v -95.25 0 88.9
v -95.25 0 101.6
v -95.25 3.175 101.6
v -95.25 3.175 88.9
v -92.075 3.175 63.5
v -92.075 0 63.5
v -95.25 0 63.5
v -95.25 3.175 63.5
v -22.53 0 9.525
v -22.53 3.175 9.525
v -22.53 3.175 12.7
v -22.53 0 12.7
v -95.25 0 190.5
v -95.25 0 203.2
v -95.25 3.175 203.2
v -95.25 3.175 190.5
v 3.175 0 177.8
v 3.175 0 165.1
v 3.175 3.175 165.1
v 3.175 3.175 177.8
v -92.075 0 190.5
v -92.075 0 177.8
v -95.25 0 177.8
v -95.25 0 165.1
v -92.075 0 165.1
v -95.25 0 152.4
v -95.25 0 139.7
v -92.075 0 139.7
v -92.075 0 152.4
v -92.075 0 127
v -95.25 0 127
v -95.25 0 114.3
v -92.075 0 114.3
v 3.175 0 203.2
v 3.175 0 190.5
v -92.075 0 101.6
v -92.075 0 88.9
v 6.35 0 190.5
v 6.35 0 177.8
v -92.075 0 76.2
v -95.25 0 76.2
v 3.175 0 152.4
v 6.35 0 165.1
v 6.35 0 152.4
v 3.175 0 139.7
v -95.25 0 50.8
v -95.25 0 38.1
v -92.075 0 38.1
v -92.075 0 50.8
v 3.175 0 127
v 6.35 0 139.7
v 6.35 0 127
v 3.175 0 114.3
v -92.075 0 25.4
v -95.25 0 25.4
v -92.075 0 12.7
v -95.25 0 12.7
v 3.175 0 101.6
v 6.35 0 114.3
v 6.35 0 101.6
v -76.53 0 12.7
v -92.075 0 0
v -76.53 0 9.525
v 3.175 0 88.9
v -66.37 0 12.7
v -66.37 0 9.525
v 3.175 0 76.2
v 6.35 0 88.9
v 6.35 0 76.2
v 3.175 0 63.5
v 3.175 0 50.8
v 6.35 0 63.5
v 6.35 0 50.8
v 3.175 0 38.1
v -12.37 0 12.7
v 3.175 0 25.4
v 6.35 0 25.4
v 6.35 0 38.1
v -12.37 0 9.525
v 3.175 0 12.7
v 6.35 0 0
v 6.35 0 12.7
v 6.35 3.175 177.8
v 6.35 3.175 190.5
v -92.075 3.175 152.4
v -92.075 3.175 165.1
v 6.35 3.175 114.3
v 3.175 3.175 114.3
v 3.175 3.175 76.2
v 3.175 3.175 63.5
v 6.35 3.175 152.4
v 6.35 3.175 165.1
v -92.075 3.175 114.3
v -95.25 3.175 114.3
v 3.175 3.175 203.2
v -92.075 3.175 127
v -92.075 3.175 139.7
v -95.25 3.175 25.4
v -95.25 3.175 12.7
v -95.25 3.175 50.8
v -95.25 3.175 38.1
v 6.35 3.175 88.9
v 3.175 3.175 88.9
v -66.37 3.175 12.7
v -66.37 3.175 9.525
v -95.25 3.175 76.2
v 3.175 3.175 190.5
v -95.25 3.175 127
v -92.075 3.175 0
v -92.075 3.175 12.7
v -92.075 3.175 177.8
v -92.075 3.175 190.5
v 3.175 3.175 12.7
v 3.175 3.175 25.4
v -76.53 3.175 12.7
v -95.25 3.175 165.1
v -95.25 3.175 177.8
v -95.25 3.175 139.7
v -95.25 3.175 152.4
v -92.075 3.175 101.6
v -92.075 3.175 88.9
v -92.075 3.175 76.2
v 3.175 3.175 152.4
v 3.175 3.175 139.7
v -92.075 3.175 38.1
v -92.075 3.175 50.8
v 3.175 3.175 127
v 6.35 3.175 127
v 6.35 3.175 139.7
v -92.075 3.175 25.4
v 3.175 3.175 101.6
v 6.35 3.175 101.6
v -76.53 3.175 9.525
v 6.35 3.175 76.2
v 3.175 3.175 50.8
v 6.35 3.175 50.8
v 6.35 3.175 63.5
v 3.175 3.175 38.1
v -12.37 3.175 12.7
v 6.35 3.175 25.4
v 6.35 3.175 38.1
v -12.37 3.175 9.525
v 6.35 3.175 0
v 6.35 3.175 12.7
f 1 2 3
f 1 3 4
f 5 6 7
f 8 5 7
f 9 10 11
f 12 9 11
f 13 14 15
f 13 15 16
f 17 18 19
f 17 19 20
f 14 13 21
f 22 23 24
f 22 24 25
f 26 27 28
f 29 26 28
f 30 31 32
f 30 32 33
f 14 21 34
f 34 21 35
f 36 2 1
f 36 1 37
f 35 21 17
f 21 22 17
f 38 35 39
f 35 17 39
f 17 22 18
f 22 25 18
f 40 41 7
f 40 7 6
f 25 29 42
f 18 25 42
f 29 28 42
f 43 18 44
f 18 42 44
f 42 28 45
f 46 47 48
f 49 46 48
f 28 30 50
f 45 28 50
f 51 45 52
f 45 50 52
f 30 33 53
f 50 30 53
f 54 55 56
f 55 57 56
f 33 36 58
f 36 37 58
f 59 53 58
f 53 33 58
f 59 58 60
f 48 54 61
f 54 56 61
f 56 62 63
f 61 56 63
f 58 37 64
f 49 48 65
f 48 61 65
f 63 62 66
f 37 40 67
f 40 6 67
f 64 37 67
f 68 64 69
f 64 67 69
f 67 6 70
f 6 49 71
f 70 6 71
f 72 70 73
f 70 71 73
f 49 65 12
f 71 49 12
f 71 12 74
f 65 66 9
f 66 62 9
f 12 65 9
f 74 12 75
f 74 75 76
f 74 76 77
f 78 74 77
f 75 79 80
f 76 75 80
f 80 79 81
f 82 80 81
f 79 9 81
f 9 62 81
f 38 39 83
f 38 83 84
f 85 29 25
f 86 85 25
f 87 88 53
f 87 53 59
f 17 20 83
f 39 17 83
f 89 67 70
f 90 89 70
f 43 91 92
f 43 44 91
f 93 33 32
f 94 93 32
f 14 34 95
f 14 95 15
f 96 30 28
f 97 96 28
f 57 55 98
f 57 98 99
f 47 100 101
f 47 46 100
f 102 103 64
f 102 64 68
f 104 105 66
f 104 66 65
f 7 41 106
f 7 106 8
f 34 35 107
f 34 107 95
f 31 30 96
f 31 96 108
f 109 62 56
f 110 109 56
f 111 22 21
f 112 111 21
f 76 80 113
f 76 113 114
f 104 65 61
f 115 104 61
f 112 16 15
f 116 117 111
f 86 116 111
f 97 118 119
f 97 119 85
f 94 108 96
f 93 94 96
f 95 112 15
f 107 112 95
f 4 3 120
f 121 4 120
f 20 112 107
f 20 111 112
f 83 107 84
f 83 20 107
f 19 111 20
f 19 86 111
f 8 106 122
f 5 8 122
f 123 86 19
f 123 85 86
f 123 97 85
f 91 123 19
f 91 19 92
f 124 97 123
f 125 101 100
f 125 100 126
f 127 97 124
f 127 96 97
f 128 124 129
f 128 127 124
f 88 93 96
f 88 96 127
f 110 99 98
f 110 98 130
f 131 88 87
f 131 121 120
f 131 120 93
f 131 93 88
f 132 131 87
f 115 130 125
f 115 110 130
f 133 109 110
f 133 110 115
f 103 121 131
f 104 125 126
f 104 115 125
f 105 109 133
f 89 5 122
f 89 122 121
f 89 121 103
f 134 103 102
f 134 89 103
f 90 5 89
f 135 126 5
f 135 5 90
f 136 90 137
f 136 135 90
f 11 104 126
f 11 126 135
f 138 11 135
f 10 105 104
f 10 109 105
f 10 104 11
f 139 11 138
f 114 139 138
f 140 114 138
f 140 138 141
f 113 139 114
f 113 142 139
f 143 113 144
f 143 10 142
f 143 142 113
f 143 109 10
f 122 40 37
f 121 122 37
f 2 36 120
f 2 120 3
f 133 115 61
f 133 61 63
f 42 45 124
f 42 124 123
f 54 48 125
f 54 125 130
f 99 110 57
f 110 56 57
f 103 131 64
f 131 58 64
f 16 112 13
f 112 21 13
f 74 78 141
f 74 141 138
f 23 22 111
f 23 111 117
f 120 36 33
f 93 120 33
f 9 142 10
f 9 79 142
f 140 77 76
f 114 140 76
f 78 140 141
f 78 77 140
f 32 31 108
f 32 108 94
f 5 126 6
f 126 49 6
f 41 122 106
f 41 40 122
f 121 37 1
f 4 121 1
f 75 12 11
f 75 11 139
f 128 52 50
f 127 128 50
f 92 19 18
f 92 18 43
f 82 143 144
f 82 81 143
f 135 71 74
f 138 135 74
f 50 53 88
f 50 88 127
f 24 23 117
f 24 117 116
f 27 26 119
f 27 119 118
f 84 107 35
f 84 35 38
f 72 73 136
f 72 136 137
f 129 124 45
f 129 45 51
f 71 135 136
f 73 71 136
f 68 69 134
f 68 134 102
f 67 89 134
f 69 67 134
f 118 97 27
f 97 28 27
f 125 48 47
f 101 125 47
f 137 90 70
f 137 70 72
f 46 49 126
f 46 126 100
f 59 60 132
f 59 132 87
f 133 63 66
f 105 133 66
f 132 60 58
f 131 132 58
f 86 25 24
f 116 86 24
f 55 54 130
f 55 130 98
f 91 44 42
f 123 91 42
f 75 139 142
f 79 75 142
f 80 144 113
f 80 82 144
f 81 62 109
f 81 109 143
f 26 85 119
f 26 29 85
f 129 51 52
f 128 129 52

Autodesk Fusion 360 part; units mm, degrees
sketch "Sketch1" plane through (0, 0, 0) normal (0, 1, 0) x (1, 0, 0)
  line L0 (3.175, -50.8) -> (3.175, -38.1)
  line L1 (3.175, -38.1) -> (3.175, -25.4)
  line L2 (6.35, -12.7) -> (3.175, -12.7)
  line L3 (3.175, -63.5) -> (6.35, -63.5)
  line L4 (3.175, -76.2) -> (3.175, -63.5)
  line L5 (6.35, -25.4) -> (3.175, -25.4)
  line L6 (3.175, -88.9) -> (3.175, -76.2)
  line L7 (6.35, -25.4) -> (6.35, -38.1)
  line L8 (6.35, -38.1) -> (3.175, -38.1)
  line L9 (3.175, -12.7) -> (3.175, 0)
  line L10 (3.175, -60.2676) -> (2.1543, -60.2676)
  line L11 (3.175, 0) -> (3.175, -59.055)
  line L12 (6.35, 0) -> (3.175, 0)
  line L13 (3.175, -25.4) -> (3.175, -12.7)
  line L14 (3.175, -101.6) -> (3.175, -88.9)
  line L15 (3.175, -76.2) -> (6.35, -76.2)
  line L16 (-95.25, -25.4) -> (-95.25, -12.7)
  line L17 (-92.075, -139.7) -> (-95.25, -139.7)
  line L18 (3.175, 0) -> (3.175, -203.2)
  line L19 (-92.075, -50.8) -> (-95.25, -50.8)
  line L20 (3.175, -50.8) -> (6.35, -50.8)
  line L21 (6.35, 0) -> (-4.7498, 0)
  line L22 (3.175, -88.9) -> (6.35, -88.9)
  line L23 (-92.075, -38.1) -> (-92.075, -25.4)
  line L24 (-92.075, -127) -> (-92.075, -114.3)
  line L25 (-95.25, 0) -> (6.35, 0)
  line L26 (-92.075, -203.2) -> (-92.075, -190.5)
  line L27 (3.175, -63.5) -> (3.175, -50.8)
  line L28 (6.35, -50.8) -> (6.35, -63.5)
  line L29 (-92.075, 0) -> (-92.075, -203.2)
  line L30 (6.35, -76.2) -> (6.35, -88.9)
  line L31 (-92.075, -95.25) -> (-92.075, -88.9)
  line L32 (6.35, 0) -> (-5.715, 0)
  line L33 (-95.25, 0) -> (-79.375, 0)
  line L34 (-92.075, -25.4) -> (-95.25, -25.4)
  line L35 (-92.075, -76.2) -> (-92.075, -63.5)
  line L36 (-4.7498, 0) -> (0.3302, 0)
  line L37 (6.35, 0) -> (6.35, -12.7)
  line L38 (6.35, -101.6) -> (3.175, -101.6)
  line L39 (-92.075, -177.8) -> (-95.25, -177.8)
  line L40 (-84.1502, 0) -> (-89.2302, 0)
  line L41 (-92.075, -139.7) -> (-92.075, -127)
  line L42 (-89.5189, -92.8088) -> (-89.7576, -92.8956)
  line L43 (-95.25, -101.6) -> (-95.25, -88.9)
  line L44 (6.35, -177.8) -> (6.35, -190.5)
  line L45 (6.35, -152.4) -> (6.35, -165.1)
  line L46 (3.175, -203.2) -> (3.175, -190.5)
  line L47 (3.175, -190.5) -> (3.175, -177.8)
  line L48 (-92.075, -63.5) -> (-95.25, -63.5)
  line L49 (-92.075, -25.4) -> (-92.075, -12.7)
  line L50 (-92.075, -190.5) -> (-95.25, -190.5)
  line L51 (-92.075, -12.7) -> (-95.25, -12.7)
  line L52 (3.175, -203.2) -> (-95.25, -203.2)
  line L53 (-92.075, -177.8) -> (-92.075, -165.1)
  line L54 (-92.075, -101.6) -> (-92.075, -95.25)
  line L55 (-92.075, -76.2) -> (-95.25, -76.2)
  line L56 (-95.25, -76.2) -> (-95.25, -63.5)
  line L57 (3.175, -114.3) -> (6.35, -114.3)
  line L58 (-95.25, -203.2) -> (-95.25, -190.5)
  line L59 (-92.075, -63.5) -> (-92.075, -50.8)
  line L60 (-92.075, -50.8) -> (-92.075, -38.1)
  line L61 (-92.075, -152.4) -> (-95.25, -152.4)
  line L62 (-92.075, -88.9) -> (-95.25, -88.9)
  line L63 (-92.075, -152.4) -> (-92.075, -139.7)
  line L64 (-95.25, -203.2) -> (-92.075, -203.2)
  line L65 (6.35, -152.4) -> (3.175, -152.4)
  line L66 (-92.075, -165.1) -> (-92.075, -152.4)
  line L67 (-92.075, -203.2) -> (-92.075, -177.8)
  line L68 (-92.075, -165.1) -> (-95.25, -165.1)
  line L69 (-92.075, -114.3) -> (-95.25, -114.3)
  line L70 (6.35, -101.6) -> (6.35, -114.3)
  line L71 (-95.25, -127) -> (-95.25, -114.3)
  line L72 (-92.075, -114.3) -> (-92.075, -101.6)
  line L73 (6.35, -139.7) -> (6.35, -127)
  line L74 (6.35, -127) -> (6.35, -139.7)
  line L75 (3.175, -177.8) -> (6.35, -177.8)
  line L76 (3.175, -165.1) -> (6.35, -165.1)
  line L77 (-92.075, -38.1) -> (-95.25, -38.1)
  line L78 (6.35, -114.3) -> (6.35, -101.6)
  line L79 (-95.25, 0) -> (-84.1502, 0)
  line L80 (-92.075, -127) -> (-95.25, -127)
  line L81 (3.175, -152.4) -> (3.175, -139.7)
  line L82 (-95.25, -177.8) -> (-95.25, -165.1)
  line L83 (6.35, -165.1) -> (6.35, -152.4)
  line L84 (-92.075, -101.6) -> (-95.25, -101.6)
  line L85 (3.175, -139.7) -> (6.35, -139.7)
  line L86 (-95.25, 0) -> (-92.075, 0)
  line L87 (-95.25, -152.4) -> (-95.25, -139.7)
  line L88 (3.175, -127) -> (3.175, -114.3)
  line L89 (6.35, -127) -> (3.175, -127)
  line L90 (3.175, -190.5) -> (6.35, -190.5)
  line L91 (-92.075, -88.9) -> (-92.075, -76.2)
  line L92 (-95.25, 0) -> (-93.6625, 0)
  line L93 (-92.075, -190.5) -> (-92.075, -177.8)
  line L94 (3.175, -177.8) -> (3.175, -165.1)
  line L95 (-95.25, -50.8) -> (-95.25, -38.1)
  point P0 (6.35, 0)
  point P1 (6.35, 0)
  dimension "d9" = 11.0998
  dimension "d10" = 11.0998
  dimension "d14" = 5.08
  dimension "d15" = 5.08
  dimension "d27" = 3.175
  dimension "d28" = 3.175
  dimension "d40" = 3.175
  dimension "d41" = 3.175
  dimension "d42" = 12.7
  dimension "d43" = 12.7
  dimension "d44" = 12.7
  dimension "d45" = 12.7
  dimension "d46" = 12.7
  dimension "d47" = 12.7
  dimension "d48" = 12.7
  dimension "d49" = 12.7
  dimension "d50" = 6.35
  dimension "d52" = 12.7
  dimension "d53" = 12.7
  dimension "d54" = 12.7
  dimension "d55" = 12.7
  dimension "d56" = 12.7
  dimension "d57" = 12.7
extrude "Extrude1" add sketch "Sketch1" along normal blind 3.175
sketch "Sketch2" plane through (0, 0, 0) normal (0, -1, 0) x (1, 0, 0)
  line L0 (-95.25, 63.5) -> (-92.075, 63.5)
  line L1 (-92.075, 63.5) -> (-92.075, 50.8)
  line L2 (-92.075, 50.8) -> (-95.25, 50.8)
  line L3 (-95.25, 50.8) -> (-95.25, 38.1)
  line L4 (-95.25, 38.1) -> (-92.075, 38.1)
  line L5 (-92.075, 38.1) -> (-92.075, 25.4)
  line L6 (-92.075, 25.4) -> (-95.25, 25.4)
  line L7 (-95.25, 25.4) -> (-95.25, 12.7)
  line L8 (-95.25, 12.7) -> (-92.075, 12.7)
  line L9 (-92.075, 12.7) -> (-92.075, 0)
  line L10 (-92.075, 0) -> (6.35, 0)
  line L11 (6.35, 0) -> (6.35, 12.7)
  line L12 (6.35, 12.7) -> (3.175, 12.7)
  line L13 (3.175, 12.7) -> (3.175, 25.4)
  line L14 (3.175, 25.4) -> (6.35, 25.4)
  line L15 (6.35, 25.4) -> (6.35, 38.1)
  line L16 (6.35, 38.1) -> (3.175, 38.1)
  line L17 (3.175, 38.1) -> (3.175, 50.8)
  line L18 (3.175, 50.8) -> (6.35, 50.8)
  line L19 (6.35, 50.8) -> (6.35, 63.5)
  line L20 (6.35, 63.5) -> (3.175, 63.5)
  line L21 (3.175, 63.5) -> (3.175, 76.2)
  line L22 (3.175, 76.2) -> (6.35, 76.2)
  line L23 (6.35, 76.2) -> (6.35, 88.9)
  line L24 (6.35, 88.9) -> (3.175, 88.9)
  line L25 (3.175, 88.9) -> (3.175, 101.6)
  line L26 (3.175, 101.6) -> (6.35, 101.6)
  line L27 (6.35, 101.6) -> (6.35, 114.3)
  line L28 (6.35, 114.3) -> (3.175, 114.3)
  line L29 (3.175, 114.3) -> (3.175, 127)
  line L30 (3.175, 127) -> (6.35, 127)
  line L31 (6.35, 127) -> (6.35, 139.7)
  line L32 (6.35, 139.7) -> (3.175, 139.7)
  line L33 (3.175, 139.7) -> (3.175, 152.4)
  line L34 (3.175, 152.4) -> (6.35, 152.4)
  line L35 (6.35, 152.4) -> (6.35, 165.1)
  line L36 (6.35, 165.1) -> (3.175, 165.1)
  line L37 (3.175, 165.1) -> (3.175, 177.8)
  line L38 (3.175, 177.8) -> (6.35, 177.8)
  line L39 (6.35, 177.8) -> (6.35, 190.5)
  line L40 (6.35, 190.5) -> (3.175, 190.5)
  line L41 (3.175, 190.5) -> (3.175, 203.2)
  line L42 (3.175, 203.2) -> (-95.25, 203.2)
  line L43 (-95.25, 203.2) -> (-95.25, 190.5)
  line L44 (-95.25, 190.5) -> (-92.075, 190.5)
  line L45 (-92.075, 190.5) -> (-92.075, 177.8)
  line L46 (-92.075, 177.8) -> (-95.25, 177.8)
  line L47 (-95.25, 177.8) -> (-95.25, 165.1)
  line L48 (-95.25, 165.1) -> (-92.075, 165.1)
  line L49 (-92.075, 165.1) -> (-92.075, 152.4)
  line L50 (-92.075, 152.4) -> (-95.25, 152.4)
  line L51 (-95.25, 152.4) -> (-95.25, 139.7)
  line L52 (-95.25, 139.7) -> (-92.075, 139.7)
  line L53 (-92.075, 139.7) -> (-92.075, 127)
  line L54 (-92.075, 127) -> (-95.25, 127)
  line L55 (-95.25, 127) -> (-95.25, 114.3)
  line L56 (-95.25, 114.3) -> (-92.075, 114.3)
  line L57 (-92.075, 114.3) -> (-92.075, 101.6)
  line L58 (-92.075, 101.6) -> (-95.25, 101.6)
  line L59 (-95.25, 101.6) -> (-95.25, 88.9)
  line L60 (-95.25, 88.9) -> (-92.075, 88.9)
  line L61 (-92.075, 88.9) -> (-92.075, 76.2)
  line L62 (-92.075, 76.2) -> (-95.25, 76.2)
  line L63 (-95.25, 76.2) -> (-95.25, 63.5)
  line L64 (6.35, 0) -> (-12.3698, 0)
  line L65 (-12.3698, 0) -> (-12.3698, 9.525)
  line L66 (-92.075, 0) -> (-76.5302, 0)
  line L67 (-76.5302, 0) -> (-76.5302, 9.525)
  line L68 (-76.5302, 9.525) -> (-66.3702, 9.525)
  line L69 (-66.3702, 9.525) -> (-66.3702, 12.7)
  line L70 (-66.3702, 12.7) -> (-76.5302, 12.7)
  line L71 (-76.5302, 12.7) -> (-76.5302, 9.525)
  line L72 (-12.3698, 9.525) -> (-22.5298, 9.525)
  line L73 (-22.5298, 9.525) -> (-22.5298, 12.7)
  line L74 (-22.5298, 12.7) -> (-12.3698, 12.7)
  line L75 (-12.3698, 12.7) -> (-12.3698, 9.525)
  dimension "d105" = 18.7198
  dimension "d106" = 9.525
  dimension "d107" = 15.5448
  dimension "d108" = 9.525
  dimension "d109" = 10.16
  dimension "d110" = 3.175
  dimension "d111" = 10.16
  dimension "d112" = 10.16
  dimension "d113" = 10.16
extrude "Extrude2" cut sketch "Sketch2" against normal blind 20.32 contours L68 L69 L70 L71 | L72 L73 L74 L75
equation "d9 = 0.5 in - 0.063 in"
